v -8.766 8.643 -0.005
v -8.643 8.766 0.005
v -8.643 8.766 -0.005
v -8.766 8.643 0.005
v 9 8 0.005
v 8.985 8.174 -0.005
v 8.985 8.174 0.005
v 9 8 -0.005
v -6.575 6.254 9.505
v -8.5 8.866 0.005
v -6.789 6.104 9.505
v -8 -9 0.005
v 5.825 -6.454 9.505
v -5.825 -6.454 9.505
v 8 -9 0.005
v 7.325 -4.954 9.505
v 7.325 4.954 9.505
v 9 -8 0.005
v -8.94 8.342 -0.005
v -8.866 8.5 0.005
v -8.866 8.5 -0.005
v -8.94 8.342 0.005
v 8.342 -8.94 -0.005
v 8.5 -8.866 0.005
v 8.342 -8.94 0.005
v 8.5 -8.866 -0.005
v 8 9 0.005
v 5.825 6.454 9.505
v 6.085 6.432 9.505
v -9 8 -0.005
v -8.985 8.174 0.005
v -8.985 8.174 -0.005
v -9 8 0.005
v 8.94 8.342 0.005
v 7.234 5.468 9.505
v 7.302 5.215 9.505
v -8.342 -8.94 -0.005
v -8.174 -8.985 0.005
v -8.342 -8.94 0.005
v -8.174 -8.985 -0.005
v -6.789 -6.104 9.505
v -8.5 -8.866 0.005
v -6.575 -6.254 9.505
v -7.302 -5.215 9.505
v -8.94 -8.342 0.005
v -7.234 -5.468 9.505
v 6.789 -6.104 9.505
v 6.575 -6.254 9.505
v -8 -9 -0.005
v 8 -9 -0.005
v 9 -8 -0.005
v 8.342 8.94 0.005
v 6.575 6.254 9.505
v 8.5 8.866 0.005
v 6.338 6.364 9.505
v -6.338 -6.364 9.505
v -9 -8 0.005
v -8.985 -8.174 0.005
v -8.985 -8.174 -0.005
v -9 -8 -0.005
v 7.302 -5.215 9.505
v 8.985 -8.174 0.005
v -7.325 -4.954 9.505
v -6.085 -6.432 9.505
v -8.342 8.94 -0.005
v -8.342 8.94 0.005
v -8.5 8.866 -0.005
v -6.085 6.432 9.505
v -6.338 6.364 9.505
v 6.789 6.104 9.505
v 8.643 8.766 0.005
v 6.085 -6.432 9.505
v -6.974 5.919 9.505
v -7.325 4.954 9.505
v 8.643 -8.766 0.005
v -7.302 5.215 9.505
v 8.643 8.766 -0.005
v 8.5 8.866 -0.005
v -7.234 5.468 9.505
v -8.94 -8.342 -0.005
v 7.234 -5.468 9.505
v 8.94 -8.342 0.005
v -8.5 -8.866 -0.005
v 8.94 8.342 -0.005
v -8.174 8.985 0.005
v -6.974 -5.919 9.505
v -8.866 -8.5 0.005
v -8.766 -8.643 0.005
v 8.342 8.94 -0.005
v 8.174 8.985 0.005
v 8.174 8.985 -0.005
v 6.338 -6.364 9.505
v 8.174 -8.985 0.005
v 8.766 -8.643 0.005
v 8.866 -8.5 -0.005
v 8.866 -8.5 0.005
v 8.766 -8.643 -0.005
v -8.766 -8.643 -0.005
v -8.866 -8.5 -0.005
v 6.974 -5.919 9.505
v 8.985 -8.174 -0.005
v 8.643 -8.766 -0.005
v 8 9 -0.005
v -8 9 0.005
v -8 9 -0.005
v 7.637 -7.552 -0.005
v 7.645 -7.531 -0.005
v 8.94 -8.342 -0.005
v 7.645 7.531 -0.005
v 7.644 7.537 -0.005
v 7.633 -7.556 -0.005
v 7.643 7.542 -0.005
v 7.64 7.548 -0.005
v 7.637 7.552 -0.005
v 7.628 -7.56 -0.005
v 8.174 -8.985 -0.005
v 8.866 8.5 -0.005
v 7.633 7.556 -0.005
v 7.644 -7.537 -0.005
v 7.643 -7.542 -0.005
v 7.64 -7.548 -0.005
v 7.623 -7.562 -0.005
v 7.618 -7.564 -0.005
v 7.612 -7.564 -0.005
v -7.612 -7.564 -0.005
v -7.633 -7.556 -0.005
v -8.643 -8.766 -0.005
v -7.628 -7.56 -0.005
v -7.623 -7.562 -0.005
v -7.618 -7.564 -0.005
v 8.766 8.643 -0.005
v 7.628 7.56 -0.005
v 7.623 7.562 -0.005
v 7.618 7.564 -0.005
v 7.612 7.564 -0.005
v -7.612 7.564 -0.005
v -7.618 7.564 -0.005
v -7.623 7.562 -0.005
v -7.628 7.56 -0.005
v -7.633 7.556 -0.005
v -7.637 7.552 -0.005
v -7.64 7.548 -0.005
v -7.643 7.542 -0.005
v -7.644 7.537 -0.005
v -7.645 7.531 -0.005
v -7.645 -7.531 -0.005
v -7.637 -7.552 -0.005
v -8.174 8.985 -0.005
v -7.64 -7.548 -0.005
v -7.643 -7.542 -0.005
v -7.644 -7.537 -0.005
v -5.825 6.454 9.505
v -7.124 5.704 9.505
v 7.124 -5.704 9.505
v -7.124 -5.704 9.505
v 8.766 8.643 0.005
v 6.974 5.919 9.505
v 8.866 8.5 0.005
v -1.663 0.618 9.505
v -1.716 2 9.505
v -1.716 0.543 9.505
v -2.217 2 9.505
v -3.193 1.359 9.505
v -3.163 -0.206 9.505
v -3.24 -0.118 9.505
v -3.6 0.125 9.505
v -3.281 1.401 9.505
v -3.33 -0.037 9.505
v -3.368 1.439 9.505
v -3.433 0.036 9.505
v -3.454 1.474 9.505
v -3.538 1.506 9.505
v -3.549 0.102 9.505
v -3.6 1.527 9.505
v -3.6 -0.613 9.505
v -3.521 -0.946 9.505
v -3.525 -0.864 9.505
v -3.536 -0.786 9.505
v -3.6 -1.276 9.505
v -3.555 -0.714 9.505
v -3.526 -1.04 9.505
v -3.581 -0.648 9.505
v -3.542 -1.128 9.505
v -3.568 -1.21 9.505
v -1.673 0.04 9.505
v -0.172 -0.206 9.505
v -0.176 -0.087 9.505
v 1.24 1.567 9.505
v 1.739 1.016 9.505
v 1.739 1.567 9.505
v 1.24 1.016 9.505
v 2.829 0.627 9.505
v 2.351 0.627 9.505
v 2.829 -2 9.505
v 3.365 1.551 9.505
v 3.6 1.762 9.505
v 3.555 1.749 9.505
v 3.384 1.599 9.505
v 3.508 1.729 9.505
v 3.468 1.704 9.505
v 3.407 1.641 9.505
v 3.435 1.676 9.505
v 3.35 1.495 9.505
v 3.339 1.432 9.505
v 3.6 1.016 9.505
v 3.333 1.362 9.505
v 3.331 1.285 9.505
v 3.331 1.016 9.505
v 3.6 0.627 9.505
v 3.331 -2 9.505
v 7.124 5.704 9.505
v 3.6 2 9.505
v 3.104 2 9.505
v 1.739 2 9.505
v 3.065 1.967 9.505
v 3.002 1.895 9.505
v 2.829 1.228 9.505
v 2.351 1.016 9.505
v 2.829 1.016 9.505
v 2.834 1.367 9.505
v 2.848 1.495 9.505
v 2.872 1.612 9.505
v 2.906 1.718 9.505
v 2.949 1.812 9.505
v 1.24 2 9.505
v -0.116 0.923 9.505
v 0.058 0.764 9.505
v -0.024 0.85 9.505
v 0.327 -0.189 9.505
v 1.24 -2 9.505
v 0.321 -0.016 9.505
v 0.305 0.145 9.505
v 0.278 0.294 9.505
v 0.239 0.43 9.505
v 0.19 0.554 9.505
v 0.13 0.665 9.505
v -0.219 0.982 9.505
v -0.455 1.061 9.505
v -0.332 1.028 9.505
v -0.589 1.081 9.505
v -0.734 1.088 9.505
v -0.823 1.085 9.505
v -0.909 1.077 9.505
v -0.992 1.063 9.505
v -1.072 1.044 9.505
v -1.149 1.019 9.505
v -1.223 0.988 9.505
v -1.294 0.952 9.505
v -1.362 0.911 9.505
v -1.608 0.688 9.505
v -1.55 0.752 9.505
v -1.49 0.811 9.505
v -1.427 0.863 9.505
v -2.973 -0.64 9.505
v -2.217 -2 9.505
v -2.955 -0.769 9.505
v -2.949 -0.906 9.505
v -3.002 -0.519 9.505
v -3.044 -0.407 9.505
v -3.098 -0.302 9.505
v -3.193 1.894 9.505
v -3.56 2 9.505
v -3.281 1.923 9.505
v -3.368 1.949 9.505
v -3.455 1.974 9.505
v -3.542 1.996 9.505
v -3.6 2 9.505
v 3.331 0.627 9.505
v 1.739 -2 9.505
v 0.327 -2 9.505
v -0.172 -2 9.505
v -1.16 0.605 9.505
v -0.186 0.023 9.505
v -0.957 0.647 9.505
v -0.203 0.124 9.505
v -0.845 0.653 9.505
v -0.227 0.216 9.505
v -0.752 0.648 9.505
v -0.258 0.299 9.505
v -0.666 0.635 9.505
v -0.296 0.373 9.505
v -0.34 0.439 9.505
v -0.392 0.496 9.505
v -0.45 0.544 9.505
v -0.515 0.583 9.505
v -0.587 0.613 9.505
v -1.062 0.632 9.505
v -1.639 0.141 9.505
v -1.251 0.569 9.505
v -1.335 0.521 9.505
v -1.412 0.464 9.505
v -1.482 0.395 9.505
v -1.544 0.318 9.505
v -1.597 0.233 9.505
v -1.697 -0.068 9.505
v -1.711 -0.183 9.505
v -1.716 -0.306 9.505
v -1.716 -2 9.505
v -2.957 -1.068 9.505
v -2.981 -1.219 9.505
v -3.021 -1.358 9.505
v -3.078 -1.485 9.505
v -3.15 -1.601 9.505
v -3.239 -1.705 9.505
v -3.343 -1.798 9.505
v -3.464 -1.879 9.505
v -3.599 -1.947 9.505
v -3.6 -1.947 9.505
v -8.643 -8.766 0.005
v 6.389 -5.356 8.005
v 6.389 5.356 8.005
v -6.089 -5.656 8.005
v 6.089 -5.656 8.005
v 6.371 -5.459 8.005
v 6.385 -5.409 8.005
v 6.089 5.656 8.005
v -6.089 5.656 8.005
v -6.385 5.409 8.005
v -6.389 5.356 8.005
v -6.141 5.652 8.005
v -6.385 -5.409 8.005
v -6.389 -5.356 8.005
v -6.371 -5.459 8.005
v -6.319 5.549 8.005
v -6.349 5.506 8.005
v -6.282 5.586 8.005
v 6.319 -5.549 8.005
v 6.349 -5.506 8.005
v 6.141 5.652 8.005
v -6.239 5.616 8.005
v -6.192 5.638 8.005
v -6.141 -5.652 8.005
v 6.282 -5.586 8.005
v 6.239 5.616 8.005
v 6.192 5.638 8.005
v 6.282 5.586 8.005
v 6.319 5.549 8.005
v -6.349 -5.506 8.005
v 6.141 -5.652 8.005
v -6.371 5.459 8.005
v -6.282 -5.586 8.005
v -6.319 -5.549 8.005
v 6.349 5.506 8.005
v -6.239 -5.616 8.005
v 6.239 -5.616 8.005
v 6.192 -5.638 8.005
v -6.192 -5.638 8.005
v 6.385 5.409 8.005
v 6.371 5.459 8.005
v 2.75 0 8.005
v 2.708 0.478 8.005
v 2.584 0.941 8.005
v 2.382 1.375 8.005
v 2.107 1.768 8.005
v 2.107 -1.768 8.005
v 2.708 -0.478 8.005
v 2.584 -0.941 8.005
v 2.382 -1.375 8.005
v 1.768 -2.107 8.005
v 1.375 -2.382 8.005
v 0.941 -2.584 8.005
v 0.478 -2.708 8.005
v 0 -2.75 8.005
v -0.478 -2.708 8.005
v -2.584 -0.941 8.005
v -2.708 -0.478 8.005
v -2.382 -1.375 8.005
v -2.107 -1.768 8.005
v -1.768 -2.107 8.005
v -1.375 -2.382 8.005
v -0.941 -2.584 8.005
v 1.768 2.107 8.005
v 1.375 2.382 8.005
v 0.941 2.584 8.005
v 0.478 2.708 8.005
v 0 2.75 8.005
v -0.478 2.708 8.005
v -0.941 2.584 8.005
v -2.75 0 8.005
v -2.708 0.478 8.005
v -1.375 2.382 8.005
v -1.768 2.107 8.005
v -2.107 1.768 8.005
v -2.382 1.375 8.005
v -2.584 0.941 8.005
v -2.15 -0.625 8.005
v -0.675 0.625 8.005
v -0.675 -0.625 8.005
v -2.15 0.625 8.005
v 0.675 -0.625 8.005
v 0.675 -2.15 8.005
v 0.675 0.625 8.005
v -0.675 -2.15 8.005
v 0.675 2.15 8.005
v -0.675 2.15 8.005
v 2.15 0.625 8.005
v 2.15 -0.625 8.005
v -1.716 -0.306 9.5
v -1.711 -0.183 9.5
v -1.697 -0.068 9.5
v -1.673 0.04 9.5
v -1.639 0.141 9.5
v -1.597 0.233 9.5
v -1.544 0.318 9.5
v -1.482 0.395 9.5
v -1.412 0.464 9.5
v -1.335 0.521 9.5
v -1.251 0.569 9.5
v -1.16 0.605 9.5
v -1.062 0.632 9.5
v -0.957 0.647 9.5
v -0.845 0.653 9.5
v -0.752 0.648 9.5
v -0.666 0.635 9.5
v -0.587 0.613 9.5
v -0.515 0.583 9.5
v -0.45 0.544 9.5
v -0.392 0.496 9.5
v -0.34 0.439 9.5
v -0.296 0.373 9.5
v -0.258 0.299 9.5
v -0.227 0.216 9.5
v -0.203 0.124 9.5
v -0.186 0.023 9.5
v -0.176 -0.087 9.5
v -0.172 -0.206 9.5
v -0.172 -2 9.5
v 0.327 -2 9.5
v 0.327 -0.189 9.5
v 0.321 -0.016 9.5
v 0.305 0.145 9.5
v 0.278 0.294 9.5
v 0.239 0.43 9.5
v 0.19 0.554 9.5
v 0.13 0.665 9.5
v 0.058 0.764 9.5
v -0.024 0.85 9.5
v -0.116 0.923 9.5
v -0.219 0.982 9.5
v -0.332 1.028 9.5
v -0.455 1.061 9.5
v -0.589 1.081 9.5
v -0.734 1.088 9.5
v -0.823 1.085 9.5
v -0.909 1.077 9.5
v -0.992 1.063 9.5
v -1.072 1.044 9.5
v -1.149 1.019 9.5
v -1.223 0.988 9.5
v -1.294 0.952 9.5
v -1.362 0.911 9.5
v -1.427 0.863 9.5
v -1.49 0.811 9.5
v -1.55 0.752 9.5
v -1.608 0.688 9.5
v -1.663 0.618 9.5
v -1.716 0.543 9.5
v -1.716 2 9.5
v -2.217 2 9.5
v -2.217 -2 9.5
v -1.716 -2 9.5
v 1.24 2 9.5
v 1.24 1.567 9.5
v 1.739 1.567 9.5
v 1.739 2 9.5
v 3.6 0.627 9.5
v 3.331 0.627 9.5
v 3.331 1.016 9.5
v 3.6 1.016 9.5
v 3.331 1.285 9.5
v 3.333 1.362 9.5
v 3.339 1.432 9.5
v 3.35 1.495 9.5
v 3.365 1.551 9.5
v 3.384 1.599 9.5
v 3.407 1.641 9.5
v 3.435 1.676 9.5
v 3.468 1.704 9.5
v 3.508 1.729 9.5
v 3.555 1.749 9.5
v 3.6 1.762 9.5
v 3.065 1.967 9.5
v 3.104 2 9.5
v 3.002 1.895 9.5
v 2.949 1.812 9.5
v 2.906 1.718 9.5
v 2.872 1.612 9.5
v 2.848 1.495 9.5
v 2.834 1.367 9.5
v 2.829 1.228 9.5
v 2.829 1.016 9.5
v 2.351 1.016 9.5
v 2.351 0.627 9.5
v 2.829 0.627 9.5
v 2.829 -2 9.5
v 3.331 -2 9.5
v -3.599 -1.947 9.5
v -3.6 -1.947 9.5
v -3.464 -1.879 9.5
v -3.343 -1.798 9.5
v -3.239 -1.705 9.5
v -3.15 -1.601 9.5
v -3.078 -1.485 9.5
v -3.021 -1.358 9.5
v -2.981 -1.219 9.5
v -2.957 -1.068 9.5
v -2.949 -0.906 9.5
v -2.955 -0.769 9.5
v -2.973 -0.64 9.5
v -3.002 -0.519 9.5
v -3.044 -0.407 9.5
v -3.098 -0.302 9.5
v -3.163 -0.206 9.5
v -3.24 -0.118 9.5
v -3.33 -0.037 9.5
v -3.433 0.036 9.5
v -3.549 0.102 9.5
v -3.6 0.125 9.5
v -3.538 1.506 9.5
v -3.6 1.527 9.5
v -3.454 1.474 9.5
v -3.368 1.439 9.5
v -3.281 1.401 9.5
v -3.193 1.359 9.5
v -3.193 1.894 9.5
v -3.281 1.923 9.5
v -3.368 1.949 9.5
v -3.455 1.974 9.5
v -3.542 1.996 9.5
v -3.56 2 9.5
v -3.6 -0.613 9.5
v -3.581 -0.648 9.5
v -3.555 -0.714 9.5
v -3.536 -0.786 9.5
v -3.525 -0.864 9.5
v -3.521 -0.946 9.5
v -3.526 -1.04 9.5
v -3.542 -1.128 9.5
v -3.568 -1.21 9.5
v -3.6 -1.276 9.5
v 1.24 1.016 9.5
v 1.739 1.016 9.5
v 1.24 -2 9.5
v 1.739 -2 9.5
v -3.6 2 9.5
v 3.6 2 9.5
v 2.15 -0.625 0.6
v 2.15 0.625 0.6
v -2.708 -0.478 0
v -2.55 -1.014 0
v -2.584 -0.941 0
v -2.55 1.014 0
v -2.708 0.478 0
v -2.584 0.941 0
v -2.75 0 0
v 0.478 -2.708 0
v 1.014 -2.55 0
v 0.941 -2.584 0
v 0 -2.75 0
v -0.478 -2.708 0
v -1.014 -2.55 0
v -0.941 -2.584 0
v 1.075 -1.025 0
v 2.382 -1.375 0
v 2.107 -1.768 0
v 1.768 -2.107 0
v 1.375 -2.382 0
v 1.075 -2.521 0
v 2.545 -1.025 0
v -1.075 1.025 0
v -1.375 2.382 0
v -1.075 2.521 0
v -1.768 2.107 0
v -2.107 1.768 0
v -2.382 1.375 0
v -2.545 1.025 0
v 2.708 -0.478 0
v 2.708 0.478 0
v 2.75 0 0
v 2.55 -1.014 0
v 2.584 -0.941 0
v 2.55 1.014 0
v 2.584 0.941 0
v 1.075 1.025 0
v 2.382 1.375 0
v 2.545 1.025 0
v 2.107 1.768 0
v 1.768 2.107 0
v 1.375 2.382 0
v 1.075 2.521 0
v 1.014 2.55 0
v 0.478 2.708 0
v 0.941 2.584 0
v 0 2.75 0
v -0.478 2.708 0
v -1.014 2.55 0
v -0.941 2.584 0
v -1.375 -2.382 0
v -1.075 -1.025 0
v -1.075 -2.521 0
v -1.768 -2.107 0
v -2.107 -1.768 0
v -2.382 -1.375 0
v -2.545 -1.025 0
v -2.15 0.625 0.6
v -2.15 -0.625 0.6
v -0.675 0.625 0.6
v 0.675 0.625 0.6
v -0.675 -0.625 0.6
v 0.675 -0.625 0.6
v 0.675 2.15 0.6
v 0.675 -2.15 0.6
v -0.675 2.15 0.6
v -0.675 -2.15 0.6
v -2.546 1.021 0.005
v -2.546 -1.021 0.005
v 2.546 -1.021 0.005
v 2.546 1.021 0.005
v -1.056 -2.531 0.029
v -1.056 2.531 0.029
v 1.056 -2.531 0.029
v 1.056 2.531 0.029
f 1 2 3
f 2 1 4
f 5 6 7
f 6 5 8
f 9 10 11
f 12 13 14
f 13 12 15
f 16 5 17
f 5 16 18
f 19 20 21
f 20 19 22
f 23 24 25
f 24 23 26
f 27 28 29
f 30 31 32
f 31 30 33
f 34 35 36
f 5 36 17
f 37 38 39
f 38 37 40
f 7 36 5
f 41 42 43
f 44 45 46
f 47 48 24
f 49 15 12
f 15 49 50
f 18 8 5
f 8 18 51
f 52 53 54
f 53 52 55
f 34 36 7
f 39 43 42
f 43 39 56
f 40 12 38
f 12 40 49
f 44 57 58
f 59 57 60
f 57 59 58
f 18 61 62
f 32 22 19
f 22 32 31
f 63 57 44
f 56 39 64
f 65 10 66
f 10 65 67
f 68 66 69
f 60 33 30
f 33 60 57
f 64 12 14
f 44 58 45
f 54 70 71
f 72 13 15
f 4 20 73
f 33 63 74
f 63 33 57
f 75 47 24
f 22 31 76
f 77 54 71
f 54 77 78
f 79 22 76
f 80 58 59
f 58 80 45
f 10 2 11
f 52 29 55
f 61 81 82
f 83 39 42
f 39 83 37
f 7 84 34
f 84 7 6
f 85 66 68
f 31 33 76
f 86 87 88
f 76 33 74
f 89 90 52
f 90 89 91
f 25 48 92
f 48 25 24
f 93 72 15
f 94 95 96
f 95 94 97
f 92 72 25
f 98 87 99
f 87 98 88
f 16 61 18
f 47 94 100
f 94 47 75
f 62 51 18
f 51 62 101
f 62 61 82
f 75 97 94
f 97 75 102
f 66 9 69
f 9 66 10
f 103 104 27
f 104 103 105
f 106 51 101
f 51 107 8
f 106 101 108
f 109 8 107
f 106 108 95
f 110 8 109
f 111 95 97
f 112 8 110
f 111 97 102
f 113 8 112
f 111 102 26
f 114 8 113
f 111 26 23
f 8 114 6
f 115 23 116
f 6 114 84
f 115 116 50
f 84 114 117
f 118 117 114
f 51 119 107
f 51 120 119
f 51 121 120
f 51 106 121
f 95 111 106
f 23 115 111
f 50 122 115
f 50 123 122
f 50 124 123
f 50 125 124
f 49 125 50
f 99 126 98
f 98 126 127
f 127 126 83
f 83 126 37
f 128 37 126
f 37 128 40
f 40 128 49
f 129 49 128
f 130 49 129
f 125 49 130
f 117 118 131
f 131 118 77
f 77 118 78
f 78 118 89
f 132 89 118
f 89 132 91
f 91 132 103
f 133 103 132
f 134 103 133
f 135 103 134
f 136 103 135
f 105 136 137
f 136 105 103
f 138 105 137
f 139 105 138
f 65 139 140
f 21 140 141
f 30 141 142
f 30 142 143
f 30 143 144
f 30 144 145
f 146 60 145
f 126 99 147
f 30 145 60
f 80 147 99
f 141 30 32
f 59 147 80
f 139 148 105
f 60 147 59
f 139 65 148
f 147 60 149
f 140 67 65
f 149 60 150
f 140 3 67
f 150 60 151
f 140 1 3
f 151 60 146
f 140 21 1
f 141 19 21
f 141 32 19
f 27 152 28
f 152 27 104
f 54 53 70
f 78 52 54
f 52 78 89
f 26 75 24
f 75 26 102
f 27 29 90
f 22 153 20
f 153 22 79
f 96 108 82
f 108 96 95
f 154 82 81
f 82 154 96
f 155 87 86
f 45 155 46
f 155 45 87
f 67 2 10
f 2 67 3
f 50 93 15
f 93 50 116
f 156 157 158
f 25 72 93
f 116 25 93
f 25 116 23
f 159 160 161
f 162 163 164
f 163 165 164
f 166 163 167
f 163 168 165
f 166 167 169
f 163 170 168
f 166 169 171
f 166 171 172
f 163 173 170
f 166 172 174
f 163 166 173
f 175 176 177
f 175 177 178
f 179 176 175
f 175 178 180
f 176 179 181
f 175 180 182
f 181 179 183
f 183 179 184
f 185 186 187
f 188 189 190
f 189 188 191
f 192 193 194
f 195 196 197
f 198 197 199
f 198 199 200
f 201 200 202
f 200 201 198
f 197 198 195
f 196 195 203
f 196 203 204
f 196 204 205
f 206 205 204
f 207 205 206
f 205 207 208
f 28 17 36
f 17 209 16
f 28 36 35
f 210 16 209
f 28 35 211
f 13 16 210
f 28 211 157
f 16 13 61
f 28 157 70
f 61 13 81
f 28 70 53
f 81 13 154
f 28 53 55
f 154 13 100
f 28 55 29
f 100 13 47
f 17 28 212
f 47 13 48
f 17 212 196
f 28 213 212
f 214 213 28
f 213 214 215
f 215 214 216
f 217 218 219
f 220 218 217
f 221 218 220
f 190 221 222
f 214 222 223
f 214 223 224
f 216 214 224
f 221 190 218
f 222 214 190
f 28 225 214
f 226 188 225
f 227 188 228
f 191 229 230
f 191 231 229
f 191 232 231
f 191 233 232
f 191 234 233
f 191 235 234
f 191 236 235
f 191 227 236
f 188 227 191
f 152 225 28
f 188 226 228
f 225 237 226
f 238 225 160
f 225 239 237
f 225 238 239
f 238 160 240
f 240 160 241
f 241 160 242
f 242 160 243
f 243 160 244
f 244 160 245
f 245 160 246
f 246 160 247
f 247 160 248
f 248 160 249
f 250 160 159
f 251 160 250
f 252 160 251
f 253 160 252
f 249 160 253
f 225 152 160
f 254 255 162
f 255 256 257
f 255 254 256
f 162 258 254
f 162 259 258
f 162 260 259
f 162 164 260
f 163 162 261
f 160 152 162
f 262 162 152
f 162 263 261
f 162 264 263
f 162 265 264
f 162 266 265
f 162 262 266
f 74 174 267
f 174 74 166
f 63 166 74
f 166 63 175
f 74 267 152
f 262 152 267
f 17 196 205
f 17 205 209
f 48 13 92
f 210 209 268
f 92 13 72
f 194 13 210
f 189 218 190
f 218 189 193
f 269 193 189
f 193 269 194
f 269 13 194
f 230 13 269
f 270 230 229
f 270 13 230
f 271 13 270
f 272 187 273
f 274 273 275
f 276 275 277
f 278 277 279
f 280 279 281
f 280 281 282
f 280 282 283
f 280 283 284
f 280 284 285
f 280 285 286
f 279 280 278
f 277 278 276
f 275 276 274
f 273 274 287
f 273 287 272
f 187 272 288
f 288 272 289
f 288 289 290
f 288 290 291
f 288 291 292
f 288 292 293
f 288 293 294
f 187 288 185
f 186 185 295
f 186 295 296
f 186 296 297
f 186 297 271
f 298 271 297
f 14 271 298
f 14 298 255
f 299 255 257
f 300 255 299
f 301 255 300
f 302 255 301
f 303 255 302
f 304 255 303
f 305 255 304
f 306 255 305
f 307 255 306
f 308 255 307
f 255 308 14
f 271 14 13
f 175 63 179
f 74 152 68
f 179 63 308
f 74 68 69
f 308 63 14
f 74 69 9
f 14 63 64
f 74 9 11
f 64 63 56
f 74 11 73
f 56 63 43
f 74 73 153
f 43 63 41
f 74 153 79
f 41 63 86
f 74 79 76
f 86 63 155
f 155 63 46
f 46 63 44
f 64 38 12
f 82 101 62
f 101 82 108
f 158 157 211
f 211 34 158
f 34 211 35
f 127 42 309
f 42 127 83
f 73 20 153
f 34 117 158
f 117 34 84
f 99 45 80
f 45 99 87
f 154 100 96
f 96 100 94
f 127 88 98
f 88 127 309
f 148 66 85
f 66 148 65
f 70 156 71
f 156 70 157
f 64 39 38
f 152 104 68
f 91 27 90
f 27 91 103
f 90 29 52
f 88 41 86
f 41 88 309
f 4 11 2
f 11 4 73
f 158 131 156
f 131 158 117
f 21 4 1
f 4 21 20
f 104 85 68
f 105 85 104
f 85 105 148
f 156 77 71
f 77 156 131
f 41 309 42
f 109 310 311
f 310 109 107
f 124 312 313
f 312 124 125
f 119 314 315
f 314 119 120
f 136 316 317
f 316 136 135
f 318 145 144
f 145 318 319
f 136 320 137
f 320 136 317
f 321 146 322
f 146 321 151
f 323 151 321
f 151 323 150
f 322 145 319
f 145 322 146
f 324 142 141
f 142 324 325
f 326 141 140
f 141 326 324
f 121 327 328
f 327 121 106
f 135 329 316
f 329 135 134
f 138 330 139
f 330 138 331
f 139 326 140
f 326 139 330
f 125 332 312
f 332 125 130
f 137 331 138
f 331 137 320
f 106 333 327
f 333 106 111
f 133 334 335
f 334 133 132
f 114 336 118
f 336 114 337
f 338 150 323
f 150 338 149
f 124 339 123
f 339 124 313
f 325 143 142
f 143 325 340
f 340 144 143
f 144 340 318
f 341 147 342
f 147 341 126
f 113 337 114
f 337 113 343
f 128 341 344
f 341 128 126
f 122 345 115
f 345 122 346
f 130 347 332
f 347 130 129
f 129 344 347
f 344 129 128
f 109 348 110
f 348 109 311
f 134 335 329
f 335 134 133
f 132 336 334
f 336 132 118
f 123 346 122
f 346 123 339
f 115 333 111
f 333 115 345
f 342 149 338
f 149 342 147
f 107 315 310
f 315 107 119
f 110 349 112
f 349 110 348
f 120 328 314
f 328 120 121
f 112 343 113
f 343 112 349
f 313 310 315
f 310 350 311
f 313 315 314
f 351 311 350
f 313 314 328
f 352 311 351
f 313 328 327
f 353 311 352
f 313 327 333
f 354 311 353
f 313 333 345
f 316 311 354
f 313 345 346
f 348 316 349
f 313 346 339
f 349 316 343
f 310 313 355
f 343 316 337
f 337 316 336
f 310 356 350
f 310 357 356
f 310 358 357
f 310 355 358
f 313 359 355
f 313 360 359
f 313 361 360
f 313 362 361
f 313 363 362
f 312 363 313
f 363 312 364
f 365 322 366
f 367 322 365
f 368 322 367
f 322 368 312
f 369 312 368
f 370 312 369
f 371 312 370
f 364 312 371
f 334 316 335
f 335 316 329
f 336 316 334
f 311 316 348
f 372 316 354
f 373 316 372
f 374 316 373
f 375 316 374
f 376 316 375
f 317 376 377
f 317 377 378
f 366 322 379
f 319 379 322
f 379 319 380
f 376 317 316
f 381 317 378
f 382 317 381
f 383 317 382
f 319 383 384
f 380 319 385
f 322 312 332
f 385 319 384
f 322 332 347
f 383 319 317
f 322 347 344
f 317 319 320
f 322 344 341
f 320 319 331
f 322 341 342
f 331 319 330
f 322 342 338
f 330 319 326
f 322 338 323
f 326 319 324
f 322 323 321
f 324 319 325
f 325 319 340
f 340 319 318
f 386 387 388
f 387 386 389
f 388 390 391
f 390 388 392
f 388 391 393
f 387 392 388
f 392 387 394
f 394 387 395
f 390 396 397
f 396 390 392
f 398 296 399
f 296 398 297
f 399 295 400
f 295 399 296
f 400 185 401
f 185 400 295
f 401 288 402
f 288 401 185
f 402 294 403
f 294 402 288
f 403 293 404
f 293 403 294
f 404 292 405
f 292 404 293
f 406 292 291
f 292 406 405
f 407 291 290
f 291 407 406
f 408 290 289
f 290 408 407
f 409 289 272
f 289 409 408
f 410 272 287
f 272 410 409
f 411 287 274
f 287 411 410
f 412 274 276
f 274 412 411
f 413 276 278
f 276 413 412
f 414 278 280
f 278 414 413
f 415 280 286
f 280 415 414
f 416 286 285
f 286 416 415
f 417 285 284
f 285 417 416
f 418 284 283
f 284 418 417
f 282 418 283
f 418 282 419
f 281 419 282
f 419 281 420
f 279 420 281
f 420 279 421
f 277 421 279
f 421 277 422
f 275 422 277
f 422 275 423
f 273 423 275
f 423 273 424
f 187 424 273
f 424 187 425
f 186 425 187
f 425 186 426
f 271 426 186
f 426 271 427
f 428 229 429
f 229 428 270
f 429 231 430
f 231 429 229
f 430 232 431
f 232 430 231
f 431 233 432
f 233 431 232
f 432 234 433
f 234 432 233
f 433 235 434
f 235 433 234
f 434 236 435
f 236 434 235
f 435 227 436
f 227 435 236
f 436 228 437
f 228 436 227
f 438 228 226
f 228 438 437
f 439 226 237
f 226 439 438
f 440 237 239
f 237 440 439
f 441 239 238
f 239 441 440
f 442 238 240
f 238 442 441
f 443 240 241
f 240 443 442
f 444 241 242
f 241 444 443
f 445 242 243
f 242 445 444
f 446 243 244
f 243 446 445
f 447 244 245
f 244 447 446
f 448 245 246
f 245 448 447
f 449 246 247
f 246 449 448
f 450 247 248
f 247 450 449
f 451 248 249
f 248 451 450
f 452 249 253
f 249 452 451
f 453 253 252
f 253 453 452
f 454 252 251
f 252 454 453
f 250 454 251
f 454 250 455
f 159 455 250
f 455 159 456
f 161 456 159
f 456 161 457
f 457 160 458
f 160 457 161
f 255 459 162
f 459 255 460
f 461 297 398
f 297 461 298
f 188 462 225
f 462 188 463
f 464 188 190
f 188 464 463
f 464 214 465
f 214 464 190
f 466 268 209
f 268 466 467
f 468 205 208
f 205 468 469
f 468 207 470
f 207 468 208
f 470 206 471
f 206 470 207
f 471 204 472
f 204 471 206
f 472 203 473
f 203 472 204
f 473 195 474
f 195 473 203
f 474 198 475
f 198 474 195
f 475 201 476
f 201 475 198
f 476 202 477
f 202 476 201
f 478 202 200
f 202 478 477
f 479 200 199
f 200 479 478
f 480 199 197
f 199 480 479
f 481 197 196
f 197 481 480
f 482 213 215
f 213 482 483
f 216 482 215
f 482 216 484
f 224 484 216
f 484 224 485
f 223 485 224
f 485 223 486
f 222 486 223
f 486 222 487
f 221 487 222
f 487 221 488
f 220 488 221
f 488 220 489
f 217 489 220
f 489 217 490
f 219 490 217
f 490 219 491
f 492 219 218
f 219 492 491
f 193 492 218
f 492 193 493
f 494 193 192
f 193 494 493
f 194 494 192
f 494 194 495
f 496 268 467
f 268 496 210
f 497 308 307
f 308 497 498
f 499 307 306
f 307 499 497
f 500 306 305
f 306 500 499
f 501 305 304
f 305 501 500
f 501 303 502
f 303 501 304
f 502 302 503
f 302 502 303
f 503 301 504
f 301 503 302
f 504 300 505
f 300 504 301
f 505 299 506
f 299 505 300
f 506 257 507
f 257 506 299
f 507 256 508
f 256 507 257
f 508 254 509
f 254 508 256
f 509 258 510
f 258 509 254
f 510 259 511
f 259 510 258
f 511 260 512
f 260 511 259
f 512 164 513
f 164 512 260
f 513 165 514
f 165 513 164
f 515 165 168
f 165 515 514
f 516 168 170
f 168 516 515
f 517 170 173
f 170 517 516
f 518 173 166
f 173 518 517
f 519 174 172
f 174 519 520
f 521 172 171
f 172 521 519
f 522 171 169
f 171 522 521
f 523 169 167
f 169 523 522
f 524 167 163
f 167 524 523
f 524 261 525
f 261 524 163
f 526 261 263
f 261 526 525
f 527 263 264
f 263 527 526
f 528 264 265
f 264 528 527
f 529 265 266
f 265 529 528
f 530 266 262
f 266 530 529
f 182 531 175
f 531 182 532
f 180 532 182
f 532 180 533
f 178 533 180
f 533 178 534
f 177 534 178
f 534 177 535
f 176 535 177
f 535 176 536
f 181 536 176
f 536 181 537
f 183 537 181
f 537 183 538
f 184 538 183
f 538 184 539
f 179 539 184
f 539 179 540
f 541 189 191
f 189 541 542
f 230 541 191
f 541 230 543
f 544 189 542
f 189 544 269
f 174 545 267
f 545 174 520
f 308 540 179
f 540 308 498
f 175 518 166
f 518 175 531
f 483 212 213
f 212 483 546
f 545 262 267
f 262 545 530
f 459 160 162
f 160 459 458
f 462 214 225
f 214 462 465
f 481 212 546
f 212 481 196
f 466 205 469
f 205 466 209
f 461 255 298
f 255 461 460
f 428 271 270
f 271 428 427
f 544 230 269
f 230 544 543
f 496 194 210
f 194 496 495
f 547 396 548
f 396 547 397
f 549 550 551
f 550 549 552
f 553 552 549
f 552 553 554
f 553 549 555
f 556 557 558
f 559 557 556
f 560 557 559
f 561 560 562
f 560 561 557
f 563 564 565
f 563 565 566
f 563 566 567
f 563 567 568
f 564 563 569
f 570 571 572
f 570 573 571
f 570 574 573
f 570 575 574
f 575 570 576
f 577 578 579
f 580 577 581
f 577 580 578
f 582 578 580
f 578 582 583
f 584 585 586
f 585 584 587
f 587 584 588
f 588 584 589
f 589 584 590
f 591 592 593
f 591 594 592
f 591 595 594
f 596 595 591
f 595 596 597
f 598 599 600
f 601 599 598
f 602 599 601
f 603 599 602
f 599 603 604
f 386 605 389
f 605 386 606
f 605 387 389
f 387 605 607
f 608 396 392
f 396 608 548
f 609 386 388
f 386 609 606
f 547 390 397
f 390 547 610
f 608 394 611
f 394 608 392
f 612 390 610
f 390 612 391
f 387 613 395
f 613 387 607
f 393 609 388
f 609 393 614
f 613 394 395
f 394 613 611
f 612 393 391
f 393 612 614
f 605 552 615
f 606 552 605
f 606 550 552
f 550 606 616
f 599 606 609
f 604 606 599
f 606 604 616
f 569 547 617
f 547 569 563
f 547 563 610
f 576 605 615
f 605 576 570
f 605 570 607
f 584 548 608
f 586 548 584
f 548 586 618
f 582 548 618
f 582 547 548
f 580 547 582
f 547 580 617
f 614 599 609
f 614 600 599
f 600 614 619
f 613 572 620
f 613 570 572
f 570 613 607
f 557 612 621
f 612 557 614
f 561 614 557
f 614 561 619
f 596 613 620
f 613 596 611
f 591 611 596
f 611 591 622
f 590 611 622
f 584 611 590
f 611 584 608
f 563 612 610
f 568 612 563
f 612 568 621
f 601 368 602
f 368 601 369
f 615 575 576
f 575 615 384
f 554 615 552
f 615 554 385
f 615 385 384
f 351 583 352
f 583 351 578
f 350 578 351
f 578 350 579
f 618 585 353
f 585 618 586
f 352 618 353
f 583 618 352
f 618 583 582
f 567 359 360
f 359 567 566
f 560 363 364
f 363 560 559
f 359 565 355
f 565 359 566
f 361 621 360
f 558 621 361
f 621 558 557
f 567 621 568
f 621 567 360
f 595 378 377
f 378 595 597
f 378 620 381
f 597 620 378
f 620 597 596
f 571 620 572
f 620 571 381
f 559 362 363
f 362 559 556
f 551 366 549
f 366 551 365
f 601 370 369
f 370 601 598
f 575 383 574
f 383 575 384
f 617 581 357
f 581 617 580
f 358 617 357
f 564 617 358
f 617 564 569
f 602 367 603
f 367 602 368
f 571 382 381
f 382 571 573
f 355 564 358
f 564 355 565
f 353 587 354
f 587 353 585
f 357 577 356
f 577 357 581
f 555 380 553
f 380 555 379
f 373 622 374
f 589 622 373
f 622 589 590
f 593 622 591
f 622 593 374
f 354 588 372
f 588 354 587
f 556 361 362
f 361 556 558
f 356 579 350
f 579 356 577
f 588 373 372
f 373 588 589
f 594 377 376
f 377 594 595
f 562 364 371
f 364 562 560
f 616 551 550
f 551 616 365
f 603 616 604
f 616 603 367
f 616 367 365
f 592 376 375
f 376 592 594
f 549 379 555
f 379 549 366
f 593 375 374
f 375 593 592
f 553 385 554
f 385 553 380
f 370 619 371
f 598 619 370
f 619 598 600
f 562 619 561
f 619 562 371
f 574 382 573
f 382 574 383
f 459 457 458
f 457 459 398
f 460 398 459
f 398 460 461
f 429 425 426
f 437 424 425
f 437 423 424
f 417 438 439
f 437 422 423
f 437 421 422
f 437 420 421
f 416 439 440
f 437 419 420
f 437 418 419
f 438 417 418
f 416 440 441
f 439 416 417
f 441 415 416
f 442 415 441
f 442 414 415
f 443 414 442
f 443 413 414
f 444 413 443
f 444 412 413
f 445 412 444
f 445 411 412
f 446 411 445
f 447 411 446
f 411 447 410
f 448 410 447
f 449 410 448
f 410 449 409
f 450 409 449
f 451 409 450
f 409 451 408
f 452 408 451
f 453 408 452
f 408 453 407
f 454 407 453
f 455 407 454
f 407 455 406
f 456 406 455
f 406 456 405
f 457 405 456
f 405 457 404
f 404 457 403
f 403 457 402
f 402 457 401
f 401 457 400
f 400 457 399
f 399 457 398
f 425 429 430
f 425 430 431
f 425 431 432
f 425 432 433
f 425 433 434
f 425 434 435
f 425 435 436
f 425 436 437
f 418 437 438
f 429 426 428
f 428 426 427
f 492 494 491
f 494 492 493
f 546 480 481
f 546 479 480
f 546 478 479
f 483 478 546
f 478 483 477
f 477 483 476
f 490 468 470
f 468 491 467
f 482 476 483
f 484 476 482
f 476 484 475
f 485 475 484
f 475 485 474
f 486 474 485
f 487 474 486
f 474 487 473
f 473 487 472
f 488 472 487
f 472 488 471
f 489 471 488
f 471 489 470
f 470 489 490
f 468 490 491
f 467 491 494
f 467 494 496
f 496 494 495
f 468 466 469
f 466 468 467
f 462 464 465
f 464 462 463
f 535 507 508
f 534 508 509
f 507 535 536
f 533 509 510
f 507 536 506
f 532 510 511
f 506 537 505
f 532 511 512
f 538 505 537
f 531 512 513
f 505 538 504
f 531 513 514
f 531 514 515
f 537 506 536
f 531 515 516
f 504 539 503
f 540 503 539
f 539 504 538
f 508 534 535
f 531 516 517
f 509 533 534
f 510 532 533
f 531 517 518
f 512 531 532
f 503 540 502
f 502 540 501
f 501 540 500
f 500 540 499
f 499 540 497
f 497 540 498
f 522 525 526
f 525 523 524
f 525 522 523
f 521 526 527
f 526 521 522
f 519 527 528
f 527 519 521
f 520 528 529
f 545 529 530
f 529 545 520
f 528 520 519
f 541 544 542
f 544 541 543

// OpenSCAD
export_target = "preview";
include <common/custom-shell-params.scad>

user_key_width = 18;
user_key_depth = 18;
user_top_center_height = 9.5;
user_top_pitch_deg = 0;
user_top_roll_deg = 0;
user_wall_thickness = 1.2;
user_top_scale = 0.84;
user_legend_enabled = true;
user_legend_text = "Shift";
user_legend_font_name = "M PLUS 1:style=Regular";
user_legend_underline_enabled = false;
user_legend_width = 7.2;
user_legend_depth = 4.0;
user_legend_height = 0;
user_legend_embed = 0.6;
user_legend_outline_delta = 0;
user_homing_bar_height = 0.6;
user_homing_bar_length = 4.0;
user_homing_bar_width = 1.58;
user_homing_bar_offset_y = -3.5;
user_homing_bar_chamfer = 0.3;
user_stem_type = "choc_v2";
user_stem_outer_delta = 0;
user_stem_cross_margin = 0;
user_stem_inset_delta = 0;
user_homing_bar_enabled = false;

include <../base/keycap.scad>
